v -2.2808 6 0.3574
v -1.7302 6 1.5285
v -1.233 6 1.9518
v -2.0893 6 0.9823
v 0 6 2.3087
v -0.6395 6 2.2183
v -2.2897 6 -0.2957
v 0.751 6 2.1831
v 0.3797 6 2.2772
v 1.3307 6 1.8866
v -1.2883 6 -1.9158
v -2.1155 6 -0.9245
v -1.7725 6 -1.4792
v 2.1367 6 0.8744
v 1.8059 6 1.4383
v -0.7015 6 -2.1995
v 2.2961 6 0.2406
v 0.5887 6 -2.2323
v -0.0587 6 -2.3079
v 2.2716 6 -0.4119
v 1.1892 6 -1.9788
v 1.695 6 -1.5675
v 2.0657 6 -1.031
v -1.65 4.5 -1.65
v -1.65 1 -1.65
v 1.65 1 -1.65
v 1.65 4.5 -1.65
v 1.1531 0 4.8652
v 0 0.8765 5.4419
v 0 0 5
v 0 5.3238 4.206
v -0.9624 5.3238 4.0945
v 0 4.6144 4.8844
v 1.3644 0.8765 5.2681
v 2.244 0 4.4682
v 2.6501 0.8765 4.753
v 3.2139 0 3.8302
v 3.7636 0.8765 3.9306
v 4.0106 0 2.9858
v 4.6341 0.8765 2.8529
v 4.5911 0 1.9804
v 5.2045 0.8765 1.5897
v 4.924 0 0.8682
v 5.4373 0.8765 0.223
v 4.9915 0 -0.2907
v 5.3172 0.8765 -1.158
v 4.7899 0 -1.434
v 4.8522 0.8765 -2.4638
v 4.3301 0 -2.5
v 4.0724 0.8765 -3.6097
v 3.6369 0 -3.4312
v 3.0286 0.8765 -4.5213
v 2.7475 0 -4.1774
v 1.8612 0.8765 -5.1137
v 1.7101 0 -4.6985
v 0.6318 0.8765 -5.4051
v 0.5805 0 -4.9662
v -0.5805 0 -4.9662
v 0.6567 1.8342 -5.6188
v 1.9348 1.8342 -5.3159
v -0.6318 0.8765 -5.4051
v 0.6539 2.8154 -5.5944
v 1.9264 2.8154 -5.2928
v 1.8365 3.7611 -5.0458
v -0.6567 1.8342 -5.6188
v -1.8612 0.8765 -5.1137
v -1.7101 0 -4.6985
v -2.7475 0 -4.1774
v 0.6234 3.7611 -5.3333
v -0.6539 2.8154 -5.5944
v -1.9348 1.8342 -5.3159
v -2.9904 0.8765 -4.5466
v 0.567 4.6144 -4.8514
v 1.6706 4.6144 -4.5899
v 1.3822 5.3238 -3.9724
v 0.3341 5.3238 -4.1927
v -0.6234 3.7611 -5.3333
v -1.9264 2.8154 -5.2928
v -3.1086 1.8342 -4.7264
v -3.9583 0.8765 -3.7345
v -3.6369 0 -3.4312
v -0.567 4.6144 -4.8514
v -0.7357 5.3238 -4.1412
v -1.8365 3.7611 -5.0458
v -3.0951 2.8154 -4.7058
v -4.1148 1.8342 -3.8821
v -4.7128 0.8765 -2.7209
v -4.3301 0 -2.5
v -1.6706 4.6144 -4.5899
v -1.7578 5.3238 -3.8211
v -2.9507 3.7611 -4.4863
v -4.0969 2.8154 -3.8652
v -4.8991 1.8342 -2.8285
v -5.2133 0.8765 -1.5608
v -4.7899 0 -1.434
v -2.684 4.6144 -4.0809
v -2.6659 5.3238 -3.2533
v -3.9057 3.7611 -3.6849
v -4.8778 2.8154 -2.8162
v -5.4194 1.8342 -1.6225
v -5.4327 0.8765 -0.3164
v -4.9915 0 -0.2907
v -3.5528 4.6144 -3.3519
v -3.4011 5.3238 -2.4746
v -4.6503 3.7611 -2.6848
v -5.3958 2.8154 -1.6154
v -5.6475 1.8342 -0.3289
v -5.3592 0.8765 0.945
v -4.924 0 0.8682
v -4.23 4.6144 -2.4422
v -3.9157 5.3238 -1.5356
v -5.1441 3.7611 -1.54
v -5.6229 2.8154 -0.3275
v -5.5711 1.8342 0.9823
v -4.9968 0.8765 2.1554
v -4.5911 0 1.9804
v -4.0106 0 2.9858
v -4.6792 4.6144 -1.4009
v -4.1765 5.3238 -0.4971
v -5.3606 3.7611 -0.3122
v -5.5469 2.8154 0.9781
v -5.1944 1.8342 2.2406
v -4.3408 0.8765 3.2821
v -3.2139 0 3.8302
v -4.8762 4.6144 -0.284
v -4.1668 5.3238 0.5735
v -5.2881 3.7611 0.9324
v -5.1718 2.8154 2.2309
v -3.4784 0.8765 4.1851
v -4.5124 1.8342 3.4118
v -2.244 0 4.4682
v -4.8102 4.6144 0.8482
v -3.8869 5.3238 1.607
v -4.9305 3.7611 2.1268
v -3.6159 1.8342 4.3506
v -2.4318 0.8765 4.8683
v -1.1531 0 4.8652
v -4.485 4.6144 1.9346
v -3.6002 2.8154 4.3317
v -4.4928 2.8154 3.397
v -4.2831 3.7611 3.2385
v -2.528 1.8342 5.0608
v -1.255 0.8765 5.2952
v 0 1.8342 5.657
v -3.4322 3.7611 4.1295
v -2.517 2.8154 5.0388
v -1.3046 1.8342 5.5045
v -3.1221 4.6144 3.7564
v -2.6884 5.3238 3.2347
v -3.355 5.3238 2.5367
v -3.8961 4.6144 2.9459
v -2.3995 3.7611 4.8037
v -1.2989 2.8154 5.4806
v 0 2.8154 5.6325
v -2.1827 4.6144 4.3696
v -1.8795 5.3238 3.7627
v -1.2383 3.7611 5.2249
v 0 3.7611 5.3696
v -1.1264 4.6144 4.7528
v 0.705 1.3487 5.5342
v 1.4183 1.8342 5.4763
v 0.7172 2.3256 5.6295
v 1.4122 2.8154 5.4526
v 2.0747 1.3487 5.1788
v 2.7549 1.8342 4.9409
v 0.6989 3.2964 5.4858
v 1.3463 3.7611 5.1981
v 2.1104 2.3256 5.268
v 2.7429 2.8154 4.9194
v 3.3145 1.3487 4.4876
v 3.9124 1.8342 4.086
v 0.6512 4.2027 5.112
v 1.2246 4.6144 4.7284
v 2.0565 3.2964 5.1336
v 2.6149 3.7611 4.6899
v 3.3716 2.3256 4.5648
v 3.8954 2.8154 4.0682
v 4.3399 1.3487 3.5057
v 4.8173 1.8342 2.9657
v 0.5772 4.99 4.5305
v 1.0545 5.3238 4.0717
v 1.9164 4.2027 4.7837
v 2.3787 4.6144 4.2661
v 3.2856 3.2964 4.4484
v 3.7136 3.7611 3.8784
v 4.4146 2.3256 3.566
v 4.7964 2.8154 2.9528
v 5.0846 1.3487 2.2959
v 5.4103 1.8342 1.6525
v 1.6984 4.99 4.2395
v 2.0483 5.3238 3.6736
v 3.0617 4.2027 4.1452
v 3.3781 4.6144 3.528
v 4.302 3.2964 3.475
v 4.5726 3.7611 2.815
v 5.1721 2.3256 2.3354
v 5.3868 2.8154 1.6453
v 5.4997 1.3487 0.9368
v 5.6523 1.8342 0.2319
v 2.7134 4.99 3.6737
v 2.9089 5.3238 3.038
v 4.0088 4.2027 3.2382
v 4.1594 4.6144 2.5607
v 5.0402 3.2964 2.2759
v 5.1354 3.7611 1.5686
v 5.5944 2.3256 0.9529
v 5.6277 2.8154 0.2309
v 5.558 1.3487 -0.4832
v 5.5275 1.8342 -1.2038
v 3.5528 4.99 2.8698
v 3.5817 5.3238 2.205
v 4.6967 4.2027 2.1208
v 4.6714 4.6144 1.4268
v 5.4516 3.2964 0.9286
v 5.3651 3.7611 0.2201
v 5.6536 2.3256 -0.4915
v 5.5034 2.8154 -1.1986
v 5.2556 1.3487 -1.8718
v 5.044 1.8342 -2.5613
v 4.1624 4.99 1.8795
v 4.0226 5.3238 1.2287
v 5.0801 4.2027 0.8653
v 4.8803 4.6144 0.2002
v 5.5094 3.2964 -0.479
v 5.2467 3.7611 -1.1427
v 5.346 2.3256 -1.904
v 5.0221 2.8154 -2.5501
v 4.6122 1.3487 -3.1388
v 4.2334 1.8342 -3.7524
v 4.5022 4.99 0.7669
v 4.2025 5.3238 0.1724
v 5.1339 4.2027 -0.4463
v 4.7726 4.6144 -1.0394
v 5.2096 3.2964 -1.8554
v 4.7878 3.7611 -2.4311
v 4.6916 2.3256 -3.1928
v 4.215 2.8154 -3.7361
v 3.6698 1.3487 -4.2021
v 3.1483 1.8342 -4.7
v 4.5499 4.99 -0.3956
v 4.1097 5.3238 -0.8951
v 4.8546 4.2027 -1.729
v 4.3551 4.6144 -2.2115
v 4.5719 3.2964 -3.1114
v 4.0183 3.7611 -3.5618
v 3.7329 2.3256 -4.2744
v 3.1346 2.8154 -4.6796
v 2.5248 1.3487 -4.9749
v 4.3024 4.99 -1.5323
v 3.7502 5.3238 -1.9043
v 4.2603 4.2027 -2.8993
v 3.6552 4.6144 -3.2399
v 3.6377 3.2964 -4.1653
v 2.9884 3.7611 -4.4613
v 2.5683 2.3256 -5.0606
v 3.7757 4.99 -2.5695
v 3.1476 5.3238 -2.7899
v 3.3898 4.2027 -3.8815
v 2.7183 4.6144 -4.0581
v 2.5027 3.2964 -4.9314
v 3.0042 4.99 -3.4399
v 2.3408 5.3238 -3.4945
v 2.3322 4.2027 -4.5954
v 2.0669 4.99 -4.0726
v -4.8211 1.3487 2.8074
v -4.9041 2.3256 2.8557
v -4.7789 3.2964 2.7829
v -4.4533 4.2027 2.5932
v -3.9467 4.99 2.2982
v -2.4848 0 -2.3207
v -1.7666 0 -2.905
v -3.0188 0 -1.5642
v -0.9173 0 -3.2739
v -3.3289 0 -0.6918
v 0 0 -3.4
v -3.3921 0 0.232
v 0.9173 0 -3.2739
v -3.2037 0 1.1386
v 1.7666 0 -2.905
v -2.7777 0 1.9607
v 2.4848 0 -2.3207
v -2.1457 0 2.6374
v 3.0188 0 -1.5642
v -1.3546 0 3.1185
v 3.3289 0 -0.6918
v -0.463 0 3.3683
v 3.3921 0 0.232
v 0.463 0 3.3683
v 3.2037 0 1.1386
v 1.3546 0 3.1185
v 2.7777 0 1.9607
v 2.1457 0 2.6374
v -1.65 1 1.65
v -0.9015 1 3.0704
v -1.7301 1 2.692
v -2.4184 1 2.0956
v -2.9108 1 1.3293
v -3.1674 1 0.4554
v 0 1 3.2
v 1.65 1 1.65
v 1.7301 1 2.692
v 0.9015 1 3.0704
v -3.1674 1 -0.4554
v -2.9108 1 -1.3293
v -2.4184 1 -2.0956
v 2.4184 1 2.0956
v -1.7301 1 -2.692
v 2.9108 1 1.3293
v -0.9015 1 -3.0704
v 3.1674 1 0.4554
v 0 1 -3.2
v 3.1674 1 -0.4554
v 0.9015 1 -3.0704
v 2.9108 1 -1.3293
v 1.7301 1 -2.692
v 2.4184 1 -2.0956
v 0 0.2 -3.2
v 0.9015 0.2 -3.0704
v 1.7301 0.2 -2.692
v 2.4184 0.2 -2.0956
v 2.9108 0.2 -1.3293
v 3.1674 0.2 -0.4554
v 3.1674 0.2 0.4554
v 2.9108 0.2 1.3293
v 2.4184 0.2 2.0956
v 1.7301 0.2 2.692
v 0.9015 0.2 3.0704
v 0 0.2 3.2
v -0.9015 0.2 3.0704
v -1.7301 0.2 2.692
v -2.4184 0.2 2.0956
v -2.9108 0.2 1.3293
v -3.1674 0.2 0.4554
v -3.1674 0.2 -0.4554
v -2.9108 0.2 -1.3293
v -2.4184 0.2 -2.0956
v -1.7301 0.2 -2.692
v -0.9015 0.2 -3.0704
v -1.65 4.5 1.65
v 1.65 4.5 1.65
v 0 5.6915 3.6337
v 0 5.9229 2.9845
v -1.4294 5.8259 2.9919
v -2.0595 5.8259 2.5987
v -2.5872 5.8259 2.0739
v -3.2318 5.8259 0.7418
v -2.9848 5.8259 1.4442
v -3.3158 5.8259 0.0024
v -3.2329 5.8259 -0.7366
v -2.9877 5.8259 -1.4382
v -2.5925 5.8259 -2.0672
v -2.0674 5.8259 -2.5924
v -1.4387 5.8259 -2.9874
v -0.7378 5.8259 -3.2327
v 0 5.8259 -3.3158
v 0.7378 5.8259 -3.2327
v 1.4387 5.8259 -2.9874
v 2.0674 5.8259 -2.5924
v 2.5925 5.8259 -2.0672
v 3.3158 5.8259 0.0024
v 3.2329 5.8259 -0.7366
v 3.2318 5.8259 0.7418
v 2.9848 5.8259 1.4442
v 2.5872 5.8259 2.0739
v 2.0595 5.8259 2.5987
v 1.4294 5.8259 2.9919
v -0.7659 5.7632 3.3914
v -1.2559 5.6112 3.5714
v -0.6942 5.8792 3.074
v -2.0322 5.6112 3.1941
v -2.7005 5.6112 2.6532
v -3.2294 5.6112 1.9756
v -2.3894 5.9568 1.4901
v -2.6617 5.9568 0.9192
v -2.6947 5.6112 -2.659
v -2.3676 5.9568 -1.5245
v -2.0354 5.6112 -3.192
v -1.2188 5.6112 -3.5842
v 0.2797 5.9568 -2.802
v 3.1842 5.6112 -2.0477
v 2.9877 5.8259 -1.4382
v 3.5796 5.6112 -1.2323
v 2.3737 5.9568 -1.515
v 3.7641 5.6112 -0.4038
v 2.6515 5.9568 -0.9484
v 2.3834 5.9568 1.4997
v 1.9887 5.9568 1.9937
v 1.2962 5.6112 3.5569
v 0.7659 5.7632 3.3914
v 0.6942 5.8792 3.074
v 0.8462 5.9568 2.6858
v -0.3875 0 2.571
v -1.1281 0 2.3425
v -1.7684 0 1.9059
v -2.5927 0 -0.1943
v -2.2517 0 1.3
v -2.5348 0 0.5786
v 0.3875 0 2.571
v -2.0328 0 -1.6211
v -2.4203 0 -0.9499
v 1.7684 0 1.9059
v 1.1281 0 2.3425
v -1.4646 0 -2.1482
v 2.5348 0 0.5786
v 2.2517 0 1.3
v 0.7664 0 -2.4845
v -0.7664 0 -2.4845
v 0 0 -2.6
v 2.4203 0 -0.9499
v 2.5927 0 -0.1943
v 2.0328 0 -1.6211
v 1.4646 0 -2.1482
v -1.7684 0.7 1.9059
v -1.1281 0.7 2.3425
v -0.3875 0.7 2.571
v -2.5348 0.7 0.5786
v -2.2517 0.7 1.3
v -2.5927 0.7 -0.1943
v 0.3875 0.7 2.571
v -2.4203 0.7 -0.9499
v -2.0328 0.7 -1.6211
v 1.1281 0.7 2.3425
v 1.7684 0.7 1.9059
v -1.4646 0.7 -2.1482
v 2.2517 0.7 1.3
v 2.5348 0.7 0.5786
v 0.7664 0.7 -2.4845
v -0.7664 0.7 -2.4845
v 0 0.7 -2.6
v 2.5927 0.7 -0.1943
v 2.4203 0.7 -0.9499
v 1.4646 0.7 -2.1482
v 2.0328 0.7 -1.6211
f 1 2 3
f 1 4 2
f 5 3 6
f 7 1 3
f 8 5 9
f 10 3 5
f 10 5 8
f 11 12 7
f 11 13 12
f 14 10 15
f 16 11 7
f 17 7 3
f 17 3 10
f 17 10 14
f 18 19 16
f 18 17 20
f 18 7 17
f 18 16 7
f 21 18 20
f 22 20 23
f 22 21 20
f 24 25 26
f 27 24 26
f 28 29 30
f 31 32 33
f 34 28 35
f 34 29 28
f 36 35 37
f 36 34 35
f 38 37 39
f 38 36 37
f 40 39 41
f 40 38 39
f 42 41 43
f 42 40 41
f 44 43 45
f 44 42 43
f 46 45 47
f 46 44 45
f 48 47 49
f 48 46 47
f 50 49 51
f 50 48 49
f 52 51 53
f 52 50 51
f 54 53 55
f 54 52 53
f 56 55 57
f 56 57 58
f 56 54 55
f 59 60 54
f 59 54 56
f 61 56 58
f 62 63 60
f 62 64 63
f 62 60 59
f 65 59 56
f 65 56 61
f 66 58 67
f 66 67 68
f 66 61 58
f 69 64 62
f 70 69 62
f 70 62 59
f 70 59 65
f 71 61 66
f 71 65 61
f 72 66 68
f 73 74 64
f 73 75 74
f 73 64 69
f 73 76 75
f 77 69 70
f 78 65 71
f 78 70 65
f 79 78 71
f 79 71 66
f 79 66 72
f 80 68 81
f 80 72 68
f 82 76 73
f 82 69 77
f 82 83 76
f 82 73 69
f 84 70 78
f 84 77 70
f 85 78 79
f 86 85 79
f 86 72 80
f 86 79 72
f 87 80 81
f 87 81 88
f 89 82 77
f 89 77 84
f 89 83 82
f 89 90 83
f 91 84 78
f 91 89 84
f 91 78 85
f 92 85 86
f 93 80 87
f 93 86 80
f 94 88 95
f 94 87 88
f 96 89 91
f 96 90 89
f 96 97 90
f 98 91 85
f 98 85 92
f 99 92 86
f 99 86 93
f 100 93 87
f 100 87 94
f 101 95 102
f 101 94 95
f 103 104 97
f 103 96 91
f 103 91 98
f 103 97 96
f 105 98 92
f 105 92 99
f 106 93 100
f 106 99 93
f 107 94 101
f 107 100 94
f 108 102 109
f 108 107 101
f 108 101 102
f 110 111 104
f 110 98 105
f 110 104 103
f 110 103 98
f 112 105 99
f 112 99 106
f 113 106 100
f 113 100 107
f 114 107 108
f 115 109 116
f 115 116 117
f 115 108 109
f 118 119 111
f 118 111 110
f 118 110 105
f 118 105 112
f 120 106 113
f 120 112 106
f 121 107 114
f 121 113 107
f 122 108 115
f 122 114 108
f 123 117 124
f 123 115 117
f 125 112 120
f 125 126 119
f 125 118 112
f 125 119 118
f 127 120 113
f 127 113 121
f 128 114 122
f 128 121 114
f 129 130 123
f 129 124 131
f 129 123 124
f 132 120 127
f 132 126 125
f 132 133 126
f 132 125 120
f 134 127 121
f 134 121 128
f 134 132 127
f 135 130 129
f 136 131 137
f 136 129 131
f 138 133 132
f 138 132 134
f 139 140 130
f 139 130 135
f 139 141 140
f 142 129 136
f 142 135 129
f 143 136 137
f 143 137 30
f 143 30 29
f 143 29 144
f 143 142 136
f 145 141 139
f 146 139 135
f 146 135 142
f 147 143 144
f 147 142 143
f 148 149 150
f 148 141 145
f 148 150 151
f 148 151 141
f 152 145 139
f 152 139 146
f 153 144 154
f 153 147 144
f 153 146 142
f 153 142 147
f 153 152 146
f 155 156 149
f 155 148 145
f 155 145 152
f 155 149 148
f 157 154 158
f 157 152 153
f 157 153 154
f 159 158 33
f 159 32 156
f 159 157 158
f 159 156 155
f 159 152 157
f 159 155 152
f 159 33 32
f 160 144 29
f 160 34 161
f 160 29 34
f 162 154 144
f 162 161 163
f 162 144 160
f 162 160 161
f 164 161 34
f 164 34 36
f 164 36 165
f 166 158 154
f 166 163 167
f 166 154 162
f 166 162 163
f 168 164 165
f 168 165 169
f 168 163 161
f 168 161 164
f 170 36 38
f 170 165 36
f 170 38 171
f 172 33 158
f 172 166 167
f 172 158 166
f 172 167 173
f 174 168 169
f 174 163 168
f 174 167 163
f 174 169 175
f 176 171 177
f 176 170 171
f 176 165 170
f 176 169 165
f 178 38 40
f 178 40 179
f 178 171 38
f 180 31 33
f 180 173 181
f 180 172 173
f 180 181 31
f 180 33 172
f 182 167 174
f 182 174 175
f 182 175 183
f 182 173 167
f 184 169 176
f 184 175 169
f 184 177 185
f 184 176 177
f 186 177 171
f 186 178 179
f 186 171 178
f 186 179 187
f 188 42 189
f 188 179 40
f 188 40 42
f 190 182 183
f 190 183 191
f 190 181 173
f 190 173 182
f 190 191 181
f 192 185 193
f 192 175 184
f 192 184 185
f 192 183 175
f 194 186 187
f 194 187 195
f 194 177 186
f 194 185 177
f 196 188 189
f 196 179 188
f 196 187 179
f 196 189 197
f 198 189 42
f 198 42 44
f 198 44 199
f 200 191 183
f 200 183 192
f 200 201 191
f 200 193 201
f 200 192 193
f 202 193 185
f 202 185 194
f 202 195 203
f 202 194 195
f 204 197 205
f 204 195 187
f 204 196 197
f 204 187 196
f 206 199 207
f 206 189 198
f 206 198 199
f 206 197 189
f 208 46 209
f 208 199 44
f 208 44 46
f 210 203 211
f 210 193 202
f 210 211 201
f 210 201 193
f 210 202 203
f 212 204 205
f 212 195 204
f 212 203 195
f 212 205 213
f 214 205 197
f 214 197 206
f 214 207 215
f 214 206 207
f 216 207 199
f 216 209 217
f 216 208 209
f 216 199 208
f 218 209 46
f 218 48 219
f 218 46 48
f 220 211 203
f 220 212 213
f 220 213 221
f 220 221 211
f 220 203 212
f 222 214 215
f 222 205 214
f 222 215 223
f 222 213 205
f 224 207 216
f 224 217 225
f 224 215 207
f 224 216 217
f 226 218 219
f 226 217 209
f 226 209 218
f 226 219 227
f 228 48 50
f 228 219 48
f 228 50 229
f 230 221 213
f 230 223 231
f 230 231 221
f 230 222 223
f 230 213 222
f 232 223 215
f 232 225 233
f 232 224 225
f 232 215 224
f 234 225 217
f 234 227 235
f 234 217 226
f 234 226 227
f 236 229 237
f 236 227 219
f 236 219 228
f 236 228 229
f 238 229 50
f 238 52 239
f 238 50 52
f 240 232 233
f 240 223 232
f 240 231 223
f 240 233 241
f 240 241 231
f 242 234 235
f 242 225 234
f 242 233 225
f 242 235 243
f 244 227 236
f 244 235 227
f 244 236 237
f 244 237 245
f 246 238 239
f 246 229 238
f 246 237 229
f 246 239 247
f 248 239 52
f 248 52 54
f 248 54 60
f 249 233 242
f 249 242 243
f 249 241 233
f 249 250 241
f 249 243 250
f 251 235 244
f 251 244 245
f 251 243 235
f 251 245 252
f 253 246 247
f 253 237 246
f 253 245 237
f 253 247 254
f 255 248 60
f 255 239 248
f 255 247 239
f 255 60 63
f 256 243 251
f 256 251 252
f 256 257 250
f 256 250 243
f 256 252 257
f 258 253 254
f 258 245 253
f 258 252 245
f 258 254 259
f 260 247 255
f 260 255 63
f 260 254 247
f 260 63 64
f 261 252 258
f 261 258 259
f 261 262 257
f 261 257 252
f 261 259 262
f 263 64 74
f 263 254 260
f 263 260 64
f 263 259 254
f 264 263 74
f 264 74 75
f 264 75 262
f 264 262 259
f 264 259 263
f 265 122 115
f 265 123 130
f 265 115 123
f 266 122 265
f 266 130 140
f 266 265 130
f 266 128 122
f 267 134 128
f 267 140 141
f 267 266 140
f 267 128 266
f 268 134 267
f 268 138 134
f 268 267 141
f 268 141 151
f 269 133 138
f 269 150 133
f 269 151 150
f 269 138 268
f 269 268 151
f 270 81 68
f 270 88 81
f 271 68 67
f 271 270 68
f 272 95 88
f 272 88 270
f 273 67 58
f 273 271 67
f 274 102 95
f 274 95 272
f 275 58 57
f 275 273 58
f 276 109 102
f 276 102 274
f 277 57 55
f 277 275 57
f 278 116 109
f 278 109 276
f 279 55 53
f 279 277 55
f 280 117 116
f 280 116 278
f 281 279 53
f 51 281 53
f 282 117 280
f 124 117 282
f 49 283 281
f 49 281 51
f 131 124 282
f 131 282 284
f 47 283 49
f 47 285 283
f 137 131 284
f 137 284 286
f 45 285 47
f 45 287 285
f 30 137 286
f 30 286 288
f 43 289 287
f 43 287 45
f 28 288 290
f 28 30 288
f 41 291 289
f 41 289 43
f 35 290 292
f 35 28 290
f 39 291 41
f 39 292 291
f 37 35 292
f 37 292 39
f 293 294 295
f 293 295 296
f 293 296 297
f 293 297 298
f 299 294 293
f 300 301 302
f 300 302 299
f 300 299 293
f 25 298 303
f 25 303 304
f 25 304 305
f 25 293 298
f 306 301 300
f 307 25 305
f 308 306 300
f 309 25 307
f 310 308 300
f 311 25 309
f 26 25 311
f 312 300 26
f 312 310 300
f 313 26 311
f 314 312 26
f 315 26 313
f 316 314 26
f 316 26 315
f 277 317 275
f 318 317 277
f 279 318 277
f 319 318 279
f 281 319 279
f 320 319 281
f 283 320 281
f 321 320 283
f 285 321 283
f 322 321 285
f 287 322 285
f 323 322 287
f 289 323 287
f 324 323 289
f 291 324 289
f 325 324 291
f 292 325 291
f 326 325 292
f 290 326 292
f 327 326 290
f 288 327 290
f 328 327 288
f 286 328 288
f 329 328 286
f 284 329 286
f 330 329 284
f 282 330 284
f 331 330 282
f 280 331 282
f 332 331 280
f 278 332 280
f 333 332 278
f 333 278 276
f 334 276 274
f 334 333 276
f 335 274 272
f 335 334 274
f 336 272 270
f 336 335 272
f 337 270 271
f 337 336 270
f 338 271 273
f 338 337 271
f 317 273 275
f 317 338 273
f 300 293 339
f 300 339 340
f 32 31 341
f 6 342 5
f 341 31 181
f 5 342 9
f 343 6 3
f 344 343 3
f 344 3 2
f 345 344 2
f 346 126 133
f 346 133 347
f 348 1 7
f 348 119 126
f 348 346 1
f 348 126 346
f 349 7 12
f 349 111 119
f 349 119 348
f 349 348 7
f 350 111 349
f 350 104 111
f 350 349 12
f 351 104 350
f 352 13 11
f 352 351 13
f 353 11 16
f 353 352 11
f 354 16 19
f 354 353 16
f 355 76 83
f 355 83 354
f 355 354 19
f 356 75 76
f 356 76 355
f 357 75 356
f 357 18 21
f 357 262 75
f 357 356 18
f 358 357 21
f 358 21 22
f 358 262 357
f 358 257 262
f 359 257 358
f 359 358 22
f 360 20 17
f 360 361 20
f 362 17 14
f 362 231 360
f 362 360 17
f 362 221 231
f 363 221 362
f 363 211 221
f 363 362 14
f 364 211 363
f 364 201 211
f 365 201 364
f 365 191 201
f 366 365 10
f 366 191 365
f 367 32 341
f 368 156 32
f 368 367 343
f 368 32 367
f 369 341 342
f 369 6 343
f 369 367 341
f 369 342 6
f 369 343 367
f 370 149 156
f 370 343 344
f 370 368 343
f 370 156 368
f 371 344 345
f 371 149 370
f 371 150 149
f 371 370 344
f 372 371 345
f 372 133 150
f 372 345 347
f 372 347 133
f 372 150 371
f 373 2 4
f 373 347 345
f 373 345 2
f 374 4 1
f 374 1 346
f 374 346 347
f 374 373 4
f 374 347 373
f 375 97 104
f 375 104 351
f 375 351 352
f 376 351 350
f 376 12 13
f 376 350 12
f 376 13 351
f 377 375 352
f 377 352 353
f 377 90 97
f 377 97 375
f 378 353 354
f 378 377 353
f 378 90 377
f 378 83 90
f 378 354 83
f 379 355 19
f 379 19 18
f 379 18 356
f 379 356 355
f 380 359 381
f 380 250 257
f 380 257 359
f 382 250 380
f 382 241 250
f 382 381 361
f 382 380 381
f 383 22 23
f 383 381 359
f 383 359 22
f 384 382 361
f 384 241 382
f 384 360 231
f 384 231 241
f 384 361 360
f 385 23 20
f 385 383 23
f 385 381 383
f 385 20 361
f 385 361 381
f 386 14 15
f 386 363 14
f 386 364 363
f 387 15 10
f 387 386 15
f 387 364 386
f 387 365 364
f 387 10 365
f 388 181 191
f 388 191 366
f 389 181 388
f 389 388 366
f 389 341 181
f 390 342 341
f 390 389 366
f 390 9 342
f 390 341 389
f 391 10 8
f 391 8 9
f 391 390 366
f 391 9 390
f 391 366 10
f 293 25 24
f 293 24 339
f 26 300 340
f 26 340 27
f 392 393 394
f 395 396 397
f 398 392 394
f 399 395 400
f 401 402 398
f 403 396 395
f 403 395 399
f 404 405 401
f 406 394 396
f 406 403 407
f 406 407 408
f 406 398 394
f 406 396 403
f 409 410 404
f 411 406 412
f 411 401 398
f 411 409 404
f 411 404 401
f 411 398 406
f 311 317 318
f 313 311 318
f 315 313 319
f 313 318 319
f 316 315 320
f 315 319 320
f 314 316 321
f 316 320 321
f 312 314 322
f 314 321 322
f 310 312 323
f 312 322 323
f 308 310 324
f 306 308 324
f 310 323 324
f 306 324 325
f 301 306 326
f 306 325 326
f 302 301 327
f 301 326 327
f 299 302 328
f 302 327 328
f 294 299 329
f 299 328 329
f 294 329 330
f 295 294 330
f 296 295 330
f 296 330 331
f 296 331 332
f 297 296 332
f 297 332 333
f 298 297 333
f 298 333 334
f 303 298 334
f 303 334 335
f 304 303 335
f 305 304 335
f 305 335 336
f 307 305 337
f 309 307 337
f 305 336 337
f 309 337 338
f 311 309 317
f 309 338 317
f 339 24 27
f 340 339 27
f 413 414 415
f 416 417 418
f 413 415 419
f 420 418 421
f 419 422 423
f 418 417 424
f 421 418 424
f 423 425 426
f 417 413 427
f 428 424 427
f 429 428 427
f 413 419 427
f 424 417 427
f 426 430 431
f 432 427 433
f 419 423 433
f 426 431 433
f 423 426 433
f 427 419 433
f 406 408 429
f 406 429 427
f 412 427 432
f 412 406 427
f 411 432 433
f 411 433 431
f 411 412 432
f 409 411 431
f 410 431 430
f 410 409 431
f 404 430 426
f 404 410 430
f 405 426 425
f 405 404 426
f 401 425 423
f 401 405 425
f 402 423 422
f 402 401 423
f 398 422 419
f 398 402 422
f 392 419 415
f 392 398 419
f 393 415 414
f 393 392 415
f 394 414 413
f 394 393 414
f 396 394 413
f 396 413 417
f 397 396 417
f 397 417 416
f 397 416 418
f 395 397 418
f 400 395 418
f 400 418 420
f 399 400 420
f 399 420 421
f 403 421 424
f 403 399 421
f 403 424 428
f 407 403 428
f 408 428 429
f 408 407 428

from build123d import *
from build123d.topology import SkipClean

# Parameters (mm, degrees)
SKETCH3_R           = 11
BOSS_EXTRUDE3_DEPTH = 6
BOSS_EXTRUDE3_TAPER = 40
FILLET1_R           = 3
FILLET2_R           = 0.4
SKETCH4_W           = 3.3
SKETCH4_H           = 3.3
CUT_EXTRUDE1_DEPTH  = 4.5
CUT_EXTRUDE2_DEPTH  = 17.07096292
CHAMFER3_SIZE       = 0.2
SKETCH7_R           = 3.2
CUT_EXTRUDE3_DEPTH  = 1
CHAMFER4_SIZE       = 0.2
SKETCH9_R           = 2.6
BOSS_EXTRUDE4_DEPTH = 0.7
FILLET3_R           = 3


# Read off the part's stored shape, not the designer's step: Mirror1
with BuildPart() as part:
    # Sketch3 → Boss-Extrude3 (new body)
    with BuildSketch(Plane(origin=(0, 0, 0), x_dir=(1, 0, 0), z_dir=(0, 1, 0))):
        Circle(SKETCH3_R)
    extrude(amount=BOSS_EXTRUDE3_DEPTH, taper=BOSS_EXTRUDE3_TAPER)

    # Fillet1
    fillet1_edges = [part.edges().sort_by_distance(p)[0] for p in [
        (-5.965402213, 6, 0),
    ]]
    fillet(fillet1_edges, radius=FILLET1_R)

    # Fillet2
    fillet2_edges = [part.edges().sort_by_distance(p)[0] for p in [
        (-11, 0, 0),
    ]]
    fillet(fillet2_edges, radius=FILLET2_R)

    # Sketch4 → Cut-Extrude1 (cut)
    with BuildSketch(Plane.XZ):
        Rectangle(SKETCH4_W, SKETCH4_H)
    extrude(amount=-CUT_EXTRUDE1_DEPTH, mode=Mode.SUBTRACT)

    # Sketch5 → Cut-Extrude2 (cut, through all)
    with BuildSketch(Plane.XZ):
        with BuildLine():
            Line((-13.652715989, 0), (13.652715989, 0))
            ThreePointArc((13.652715989, 0), (0, -15.684261885), (-13.652715989, 0))
        make_face()
    extrude(amount=-CUT_EXTRUDE2_DEPTH, mode=Mode.SUBTRACT)

    # Sketch6 → Cut-Revolve1 (revolve, cut)
    with BuildSketch(Plane(origin=(0, 0, 0), x_dir=(-1, 0, 0), z_dir=(0, 0, -1))):
        with BuildLine():
            Line((-9.420154834, 1.882786153), (-9.16303979, 2.18920393))
            ThreePointArc((-9.16303979, 2.18920393), (-8.275217918, 2.488558757), (-8.134579614, 3.414875039))
            Line((-8.134579614, 3.414875039), (-7.87746457, 3.721292816))
            ThreePointArc((-7.87746457, 3.721292816), (-6.989642699, 4.020647643), (-6.849004395, 4.946963925))
            Line((-6.849004395, 4.946963925), (-6.591889351, 5.253381703))
            ThreePointArc((-6.591889351, 5.253381703), (-5.70406748, 5.552736529), (-5.563429175, 6.479052812))
            Line((-5.563429175, 6.479052812), (-5.306314132, 6.785470589))
            ThreePointArc((-5.306314132, 6.785470589), (-4.41849226, 7.084825416), (-4.277853956, 8.011141698))
            ThreePointArc((-4.277853956, 8.011141698), (-10.583292115, 7.036077543), (-10.448615009, 0.657115044))
            ThreePointArc((-10.448615009, 0.657115044), (-9.560793138, 0.956469871), (-9.420154834, 1.882786153))
        make_face()
    revolve(axis=Axis((0, 0, 0), (0, 1, 0)), mode=Mode.SUBTRACT)

    # Mirror1: part across plane


with BuildPart() as part_1:
    with SkipClean():  # the faces are left unmerged after this step: merging them gives an invalid solid
        add(part.part)
        add(part.part.mirror(Plane(origin=(-13.652715989, 6, 0), x_dir=(1, 0, 0), z_dir=(0, 0, 1))))

    # Chamfer3
    chamfer3_edges = [part_1.edges().sort_by_distance(p)[0] for p in [
        (1.65, 0, 0.825),
        (0, 0, -1.65),
        (-1.65, 0, 0.825),
        (0, 0, 1.65),
    ]]
    chamfer(chamfer3_edges, length=CHAMFER3_SIZE)

    # Sketch7 → Cut-Extrude3 (cut)
    with SkipClean():  # the faces are left unmerged after this step: merging them gives an invalid solid
        with BuildSketch(Plane.XZ):
            with Locations(Location((0, 0, 0), (0, 0, 270))):
                Circle(SKETCH7_R)
        extrude(amount=-CUT_EXTRUDE3_DEPTH, mode=Mode.SUBTRACT)

    # Chamfer4
    chamfer4_edges = [part_1.edges().sort_by_distance(p)[0] for p in [
        (-2.2627417, 0, -2.2627417),
    ]]
    chamfer(chamfer4_edges, length=CHAMFER4_SIZE)

    # Sketch11 → Cut-Revolve2 (revolve, cut)
    with BuildSketch(Plane(origin=(0, 0, 0), x_dir=(0, 0, -1), z_dir=(1, 0, 0)), mode=Mode.PRIVATE) as cut_revolve2_sk:
        with BuildLine():
            ThreePointArc((5, 0), (5.470943184, 3.490314395), (3, 6))
            ThreePointArc((3, 6), (18.910038102, 7.970012701), (5, 0))
        make_face()
    revolve(cut_revolve2_sk.sketch.rotate(Axis((0, 0, 0), (0, 1, 0)), 180), axis=Axis((0, 0, 0), (0, 1, 0)), mode=Mode.SUBTRACT)

    # Fillet3
    fillet3_edges = [part_1.edges().sort_by_distance(p)[0] for p in [
        (0, 6, -3),
    ]]
    fillet(fillet3_edges, radius=FILLET3_R)


with BuildPart() as body_2:
    # Sketch9 → Boss-Extrude4 (new body)
    with BuildSketch(Plane.XZ):
        with Locations(Location((0, 0, 0), (0, 0, 270))):
            Circle(SKETCH9_R)
    extrude(amount=-BOSS_EXTRUDE4_DEPTH)


solid = Compound([part_1.part, body_2.part])
